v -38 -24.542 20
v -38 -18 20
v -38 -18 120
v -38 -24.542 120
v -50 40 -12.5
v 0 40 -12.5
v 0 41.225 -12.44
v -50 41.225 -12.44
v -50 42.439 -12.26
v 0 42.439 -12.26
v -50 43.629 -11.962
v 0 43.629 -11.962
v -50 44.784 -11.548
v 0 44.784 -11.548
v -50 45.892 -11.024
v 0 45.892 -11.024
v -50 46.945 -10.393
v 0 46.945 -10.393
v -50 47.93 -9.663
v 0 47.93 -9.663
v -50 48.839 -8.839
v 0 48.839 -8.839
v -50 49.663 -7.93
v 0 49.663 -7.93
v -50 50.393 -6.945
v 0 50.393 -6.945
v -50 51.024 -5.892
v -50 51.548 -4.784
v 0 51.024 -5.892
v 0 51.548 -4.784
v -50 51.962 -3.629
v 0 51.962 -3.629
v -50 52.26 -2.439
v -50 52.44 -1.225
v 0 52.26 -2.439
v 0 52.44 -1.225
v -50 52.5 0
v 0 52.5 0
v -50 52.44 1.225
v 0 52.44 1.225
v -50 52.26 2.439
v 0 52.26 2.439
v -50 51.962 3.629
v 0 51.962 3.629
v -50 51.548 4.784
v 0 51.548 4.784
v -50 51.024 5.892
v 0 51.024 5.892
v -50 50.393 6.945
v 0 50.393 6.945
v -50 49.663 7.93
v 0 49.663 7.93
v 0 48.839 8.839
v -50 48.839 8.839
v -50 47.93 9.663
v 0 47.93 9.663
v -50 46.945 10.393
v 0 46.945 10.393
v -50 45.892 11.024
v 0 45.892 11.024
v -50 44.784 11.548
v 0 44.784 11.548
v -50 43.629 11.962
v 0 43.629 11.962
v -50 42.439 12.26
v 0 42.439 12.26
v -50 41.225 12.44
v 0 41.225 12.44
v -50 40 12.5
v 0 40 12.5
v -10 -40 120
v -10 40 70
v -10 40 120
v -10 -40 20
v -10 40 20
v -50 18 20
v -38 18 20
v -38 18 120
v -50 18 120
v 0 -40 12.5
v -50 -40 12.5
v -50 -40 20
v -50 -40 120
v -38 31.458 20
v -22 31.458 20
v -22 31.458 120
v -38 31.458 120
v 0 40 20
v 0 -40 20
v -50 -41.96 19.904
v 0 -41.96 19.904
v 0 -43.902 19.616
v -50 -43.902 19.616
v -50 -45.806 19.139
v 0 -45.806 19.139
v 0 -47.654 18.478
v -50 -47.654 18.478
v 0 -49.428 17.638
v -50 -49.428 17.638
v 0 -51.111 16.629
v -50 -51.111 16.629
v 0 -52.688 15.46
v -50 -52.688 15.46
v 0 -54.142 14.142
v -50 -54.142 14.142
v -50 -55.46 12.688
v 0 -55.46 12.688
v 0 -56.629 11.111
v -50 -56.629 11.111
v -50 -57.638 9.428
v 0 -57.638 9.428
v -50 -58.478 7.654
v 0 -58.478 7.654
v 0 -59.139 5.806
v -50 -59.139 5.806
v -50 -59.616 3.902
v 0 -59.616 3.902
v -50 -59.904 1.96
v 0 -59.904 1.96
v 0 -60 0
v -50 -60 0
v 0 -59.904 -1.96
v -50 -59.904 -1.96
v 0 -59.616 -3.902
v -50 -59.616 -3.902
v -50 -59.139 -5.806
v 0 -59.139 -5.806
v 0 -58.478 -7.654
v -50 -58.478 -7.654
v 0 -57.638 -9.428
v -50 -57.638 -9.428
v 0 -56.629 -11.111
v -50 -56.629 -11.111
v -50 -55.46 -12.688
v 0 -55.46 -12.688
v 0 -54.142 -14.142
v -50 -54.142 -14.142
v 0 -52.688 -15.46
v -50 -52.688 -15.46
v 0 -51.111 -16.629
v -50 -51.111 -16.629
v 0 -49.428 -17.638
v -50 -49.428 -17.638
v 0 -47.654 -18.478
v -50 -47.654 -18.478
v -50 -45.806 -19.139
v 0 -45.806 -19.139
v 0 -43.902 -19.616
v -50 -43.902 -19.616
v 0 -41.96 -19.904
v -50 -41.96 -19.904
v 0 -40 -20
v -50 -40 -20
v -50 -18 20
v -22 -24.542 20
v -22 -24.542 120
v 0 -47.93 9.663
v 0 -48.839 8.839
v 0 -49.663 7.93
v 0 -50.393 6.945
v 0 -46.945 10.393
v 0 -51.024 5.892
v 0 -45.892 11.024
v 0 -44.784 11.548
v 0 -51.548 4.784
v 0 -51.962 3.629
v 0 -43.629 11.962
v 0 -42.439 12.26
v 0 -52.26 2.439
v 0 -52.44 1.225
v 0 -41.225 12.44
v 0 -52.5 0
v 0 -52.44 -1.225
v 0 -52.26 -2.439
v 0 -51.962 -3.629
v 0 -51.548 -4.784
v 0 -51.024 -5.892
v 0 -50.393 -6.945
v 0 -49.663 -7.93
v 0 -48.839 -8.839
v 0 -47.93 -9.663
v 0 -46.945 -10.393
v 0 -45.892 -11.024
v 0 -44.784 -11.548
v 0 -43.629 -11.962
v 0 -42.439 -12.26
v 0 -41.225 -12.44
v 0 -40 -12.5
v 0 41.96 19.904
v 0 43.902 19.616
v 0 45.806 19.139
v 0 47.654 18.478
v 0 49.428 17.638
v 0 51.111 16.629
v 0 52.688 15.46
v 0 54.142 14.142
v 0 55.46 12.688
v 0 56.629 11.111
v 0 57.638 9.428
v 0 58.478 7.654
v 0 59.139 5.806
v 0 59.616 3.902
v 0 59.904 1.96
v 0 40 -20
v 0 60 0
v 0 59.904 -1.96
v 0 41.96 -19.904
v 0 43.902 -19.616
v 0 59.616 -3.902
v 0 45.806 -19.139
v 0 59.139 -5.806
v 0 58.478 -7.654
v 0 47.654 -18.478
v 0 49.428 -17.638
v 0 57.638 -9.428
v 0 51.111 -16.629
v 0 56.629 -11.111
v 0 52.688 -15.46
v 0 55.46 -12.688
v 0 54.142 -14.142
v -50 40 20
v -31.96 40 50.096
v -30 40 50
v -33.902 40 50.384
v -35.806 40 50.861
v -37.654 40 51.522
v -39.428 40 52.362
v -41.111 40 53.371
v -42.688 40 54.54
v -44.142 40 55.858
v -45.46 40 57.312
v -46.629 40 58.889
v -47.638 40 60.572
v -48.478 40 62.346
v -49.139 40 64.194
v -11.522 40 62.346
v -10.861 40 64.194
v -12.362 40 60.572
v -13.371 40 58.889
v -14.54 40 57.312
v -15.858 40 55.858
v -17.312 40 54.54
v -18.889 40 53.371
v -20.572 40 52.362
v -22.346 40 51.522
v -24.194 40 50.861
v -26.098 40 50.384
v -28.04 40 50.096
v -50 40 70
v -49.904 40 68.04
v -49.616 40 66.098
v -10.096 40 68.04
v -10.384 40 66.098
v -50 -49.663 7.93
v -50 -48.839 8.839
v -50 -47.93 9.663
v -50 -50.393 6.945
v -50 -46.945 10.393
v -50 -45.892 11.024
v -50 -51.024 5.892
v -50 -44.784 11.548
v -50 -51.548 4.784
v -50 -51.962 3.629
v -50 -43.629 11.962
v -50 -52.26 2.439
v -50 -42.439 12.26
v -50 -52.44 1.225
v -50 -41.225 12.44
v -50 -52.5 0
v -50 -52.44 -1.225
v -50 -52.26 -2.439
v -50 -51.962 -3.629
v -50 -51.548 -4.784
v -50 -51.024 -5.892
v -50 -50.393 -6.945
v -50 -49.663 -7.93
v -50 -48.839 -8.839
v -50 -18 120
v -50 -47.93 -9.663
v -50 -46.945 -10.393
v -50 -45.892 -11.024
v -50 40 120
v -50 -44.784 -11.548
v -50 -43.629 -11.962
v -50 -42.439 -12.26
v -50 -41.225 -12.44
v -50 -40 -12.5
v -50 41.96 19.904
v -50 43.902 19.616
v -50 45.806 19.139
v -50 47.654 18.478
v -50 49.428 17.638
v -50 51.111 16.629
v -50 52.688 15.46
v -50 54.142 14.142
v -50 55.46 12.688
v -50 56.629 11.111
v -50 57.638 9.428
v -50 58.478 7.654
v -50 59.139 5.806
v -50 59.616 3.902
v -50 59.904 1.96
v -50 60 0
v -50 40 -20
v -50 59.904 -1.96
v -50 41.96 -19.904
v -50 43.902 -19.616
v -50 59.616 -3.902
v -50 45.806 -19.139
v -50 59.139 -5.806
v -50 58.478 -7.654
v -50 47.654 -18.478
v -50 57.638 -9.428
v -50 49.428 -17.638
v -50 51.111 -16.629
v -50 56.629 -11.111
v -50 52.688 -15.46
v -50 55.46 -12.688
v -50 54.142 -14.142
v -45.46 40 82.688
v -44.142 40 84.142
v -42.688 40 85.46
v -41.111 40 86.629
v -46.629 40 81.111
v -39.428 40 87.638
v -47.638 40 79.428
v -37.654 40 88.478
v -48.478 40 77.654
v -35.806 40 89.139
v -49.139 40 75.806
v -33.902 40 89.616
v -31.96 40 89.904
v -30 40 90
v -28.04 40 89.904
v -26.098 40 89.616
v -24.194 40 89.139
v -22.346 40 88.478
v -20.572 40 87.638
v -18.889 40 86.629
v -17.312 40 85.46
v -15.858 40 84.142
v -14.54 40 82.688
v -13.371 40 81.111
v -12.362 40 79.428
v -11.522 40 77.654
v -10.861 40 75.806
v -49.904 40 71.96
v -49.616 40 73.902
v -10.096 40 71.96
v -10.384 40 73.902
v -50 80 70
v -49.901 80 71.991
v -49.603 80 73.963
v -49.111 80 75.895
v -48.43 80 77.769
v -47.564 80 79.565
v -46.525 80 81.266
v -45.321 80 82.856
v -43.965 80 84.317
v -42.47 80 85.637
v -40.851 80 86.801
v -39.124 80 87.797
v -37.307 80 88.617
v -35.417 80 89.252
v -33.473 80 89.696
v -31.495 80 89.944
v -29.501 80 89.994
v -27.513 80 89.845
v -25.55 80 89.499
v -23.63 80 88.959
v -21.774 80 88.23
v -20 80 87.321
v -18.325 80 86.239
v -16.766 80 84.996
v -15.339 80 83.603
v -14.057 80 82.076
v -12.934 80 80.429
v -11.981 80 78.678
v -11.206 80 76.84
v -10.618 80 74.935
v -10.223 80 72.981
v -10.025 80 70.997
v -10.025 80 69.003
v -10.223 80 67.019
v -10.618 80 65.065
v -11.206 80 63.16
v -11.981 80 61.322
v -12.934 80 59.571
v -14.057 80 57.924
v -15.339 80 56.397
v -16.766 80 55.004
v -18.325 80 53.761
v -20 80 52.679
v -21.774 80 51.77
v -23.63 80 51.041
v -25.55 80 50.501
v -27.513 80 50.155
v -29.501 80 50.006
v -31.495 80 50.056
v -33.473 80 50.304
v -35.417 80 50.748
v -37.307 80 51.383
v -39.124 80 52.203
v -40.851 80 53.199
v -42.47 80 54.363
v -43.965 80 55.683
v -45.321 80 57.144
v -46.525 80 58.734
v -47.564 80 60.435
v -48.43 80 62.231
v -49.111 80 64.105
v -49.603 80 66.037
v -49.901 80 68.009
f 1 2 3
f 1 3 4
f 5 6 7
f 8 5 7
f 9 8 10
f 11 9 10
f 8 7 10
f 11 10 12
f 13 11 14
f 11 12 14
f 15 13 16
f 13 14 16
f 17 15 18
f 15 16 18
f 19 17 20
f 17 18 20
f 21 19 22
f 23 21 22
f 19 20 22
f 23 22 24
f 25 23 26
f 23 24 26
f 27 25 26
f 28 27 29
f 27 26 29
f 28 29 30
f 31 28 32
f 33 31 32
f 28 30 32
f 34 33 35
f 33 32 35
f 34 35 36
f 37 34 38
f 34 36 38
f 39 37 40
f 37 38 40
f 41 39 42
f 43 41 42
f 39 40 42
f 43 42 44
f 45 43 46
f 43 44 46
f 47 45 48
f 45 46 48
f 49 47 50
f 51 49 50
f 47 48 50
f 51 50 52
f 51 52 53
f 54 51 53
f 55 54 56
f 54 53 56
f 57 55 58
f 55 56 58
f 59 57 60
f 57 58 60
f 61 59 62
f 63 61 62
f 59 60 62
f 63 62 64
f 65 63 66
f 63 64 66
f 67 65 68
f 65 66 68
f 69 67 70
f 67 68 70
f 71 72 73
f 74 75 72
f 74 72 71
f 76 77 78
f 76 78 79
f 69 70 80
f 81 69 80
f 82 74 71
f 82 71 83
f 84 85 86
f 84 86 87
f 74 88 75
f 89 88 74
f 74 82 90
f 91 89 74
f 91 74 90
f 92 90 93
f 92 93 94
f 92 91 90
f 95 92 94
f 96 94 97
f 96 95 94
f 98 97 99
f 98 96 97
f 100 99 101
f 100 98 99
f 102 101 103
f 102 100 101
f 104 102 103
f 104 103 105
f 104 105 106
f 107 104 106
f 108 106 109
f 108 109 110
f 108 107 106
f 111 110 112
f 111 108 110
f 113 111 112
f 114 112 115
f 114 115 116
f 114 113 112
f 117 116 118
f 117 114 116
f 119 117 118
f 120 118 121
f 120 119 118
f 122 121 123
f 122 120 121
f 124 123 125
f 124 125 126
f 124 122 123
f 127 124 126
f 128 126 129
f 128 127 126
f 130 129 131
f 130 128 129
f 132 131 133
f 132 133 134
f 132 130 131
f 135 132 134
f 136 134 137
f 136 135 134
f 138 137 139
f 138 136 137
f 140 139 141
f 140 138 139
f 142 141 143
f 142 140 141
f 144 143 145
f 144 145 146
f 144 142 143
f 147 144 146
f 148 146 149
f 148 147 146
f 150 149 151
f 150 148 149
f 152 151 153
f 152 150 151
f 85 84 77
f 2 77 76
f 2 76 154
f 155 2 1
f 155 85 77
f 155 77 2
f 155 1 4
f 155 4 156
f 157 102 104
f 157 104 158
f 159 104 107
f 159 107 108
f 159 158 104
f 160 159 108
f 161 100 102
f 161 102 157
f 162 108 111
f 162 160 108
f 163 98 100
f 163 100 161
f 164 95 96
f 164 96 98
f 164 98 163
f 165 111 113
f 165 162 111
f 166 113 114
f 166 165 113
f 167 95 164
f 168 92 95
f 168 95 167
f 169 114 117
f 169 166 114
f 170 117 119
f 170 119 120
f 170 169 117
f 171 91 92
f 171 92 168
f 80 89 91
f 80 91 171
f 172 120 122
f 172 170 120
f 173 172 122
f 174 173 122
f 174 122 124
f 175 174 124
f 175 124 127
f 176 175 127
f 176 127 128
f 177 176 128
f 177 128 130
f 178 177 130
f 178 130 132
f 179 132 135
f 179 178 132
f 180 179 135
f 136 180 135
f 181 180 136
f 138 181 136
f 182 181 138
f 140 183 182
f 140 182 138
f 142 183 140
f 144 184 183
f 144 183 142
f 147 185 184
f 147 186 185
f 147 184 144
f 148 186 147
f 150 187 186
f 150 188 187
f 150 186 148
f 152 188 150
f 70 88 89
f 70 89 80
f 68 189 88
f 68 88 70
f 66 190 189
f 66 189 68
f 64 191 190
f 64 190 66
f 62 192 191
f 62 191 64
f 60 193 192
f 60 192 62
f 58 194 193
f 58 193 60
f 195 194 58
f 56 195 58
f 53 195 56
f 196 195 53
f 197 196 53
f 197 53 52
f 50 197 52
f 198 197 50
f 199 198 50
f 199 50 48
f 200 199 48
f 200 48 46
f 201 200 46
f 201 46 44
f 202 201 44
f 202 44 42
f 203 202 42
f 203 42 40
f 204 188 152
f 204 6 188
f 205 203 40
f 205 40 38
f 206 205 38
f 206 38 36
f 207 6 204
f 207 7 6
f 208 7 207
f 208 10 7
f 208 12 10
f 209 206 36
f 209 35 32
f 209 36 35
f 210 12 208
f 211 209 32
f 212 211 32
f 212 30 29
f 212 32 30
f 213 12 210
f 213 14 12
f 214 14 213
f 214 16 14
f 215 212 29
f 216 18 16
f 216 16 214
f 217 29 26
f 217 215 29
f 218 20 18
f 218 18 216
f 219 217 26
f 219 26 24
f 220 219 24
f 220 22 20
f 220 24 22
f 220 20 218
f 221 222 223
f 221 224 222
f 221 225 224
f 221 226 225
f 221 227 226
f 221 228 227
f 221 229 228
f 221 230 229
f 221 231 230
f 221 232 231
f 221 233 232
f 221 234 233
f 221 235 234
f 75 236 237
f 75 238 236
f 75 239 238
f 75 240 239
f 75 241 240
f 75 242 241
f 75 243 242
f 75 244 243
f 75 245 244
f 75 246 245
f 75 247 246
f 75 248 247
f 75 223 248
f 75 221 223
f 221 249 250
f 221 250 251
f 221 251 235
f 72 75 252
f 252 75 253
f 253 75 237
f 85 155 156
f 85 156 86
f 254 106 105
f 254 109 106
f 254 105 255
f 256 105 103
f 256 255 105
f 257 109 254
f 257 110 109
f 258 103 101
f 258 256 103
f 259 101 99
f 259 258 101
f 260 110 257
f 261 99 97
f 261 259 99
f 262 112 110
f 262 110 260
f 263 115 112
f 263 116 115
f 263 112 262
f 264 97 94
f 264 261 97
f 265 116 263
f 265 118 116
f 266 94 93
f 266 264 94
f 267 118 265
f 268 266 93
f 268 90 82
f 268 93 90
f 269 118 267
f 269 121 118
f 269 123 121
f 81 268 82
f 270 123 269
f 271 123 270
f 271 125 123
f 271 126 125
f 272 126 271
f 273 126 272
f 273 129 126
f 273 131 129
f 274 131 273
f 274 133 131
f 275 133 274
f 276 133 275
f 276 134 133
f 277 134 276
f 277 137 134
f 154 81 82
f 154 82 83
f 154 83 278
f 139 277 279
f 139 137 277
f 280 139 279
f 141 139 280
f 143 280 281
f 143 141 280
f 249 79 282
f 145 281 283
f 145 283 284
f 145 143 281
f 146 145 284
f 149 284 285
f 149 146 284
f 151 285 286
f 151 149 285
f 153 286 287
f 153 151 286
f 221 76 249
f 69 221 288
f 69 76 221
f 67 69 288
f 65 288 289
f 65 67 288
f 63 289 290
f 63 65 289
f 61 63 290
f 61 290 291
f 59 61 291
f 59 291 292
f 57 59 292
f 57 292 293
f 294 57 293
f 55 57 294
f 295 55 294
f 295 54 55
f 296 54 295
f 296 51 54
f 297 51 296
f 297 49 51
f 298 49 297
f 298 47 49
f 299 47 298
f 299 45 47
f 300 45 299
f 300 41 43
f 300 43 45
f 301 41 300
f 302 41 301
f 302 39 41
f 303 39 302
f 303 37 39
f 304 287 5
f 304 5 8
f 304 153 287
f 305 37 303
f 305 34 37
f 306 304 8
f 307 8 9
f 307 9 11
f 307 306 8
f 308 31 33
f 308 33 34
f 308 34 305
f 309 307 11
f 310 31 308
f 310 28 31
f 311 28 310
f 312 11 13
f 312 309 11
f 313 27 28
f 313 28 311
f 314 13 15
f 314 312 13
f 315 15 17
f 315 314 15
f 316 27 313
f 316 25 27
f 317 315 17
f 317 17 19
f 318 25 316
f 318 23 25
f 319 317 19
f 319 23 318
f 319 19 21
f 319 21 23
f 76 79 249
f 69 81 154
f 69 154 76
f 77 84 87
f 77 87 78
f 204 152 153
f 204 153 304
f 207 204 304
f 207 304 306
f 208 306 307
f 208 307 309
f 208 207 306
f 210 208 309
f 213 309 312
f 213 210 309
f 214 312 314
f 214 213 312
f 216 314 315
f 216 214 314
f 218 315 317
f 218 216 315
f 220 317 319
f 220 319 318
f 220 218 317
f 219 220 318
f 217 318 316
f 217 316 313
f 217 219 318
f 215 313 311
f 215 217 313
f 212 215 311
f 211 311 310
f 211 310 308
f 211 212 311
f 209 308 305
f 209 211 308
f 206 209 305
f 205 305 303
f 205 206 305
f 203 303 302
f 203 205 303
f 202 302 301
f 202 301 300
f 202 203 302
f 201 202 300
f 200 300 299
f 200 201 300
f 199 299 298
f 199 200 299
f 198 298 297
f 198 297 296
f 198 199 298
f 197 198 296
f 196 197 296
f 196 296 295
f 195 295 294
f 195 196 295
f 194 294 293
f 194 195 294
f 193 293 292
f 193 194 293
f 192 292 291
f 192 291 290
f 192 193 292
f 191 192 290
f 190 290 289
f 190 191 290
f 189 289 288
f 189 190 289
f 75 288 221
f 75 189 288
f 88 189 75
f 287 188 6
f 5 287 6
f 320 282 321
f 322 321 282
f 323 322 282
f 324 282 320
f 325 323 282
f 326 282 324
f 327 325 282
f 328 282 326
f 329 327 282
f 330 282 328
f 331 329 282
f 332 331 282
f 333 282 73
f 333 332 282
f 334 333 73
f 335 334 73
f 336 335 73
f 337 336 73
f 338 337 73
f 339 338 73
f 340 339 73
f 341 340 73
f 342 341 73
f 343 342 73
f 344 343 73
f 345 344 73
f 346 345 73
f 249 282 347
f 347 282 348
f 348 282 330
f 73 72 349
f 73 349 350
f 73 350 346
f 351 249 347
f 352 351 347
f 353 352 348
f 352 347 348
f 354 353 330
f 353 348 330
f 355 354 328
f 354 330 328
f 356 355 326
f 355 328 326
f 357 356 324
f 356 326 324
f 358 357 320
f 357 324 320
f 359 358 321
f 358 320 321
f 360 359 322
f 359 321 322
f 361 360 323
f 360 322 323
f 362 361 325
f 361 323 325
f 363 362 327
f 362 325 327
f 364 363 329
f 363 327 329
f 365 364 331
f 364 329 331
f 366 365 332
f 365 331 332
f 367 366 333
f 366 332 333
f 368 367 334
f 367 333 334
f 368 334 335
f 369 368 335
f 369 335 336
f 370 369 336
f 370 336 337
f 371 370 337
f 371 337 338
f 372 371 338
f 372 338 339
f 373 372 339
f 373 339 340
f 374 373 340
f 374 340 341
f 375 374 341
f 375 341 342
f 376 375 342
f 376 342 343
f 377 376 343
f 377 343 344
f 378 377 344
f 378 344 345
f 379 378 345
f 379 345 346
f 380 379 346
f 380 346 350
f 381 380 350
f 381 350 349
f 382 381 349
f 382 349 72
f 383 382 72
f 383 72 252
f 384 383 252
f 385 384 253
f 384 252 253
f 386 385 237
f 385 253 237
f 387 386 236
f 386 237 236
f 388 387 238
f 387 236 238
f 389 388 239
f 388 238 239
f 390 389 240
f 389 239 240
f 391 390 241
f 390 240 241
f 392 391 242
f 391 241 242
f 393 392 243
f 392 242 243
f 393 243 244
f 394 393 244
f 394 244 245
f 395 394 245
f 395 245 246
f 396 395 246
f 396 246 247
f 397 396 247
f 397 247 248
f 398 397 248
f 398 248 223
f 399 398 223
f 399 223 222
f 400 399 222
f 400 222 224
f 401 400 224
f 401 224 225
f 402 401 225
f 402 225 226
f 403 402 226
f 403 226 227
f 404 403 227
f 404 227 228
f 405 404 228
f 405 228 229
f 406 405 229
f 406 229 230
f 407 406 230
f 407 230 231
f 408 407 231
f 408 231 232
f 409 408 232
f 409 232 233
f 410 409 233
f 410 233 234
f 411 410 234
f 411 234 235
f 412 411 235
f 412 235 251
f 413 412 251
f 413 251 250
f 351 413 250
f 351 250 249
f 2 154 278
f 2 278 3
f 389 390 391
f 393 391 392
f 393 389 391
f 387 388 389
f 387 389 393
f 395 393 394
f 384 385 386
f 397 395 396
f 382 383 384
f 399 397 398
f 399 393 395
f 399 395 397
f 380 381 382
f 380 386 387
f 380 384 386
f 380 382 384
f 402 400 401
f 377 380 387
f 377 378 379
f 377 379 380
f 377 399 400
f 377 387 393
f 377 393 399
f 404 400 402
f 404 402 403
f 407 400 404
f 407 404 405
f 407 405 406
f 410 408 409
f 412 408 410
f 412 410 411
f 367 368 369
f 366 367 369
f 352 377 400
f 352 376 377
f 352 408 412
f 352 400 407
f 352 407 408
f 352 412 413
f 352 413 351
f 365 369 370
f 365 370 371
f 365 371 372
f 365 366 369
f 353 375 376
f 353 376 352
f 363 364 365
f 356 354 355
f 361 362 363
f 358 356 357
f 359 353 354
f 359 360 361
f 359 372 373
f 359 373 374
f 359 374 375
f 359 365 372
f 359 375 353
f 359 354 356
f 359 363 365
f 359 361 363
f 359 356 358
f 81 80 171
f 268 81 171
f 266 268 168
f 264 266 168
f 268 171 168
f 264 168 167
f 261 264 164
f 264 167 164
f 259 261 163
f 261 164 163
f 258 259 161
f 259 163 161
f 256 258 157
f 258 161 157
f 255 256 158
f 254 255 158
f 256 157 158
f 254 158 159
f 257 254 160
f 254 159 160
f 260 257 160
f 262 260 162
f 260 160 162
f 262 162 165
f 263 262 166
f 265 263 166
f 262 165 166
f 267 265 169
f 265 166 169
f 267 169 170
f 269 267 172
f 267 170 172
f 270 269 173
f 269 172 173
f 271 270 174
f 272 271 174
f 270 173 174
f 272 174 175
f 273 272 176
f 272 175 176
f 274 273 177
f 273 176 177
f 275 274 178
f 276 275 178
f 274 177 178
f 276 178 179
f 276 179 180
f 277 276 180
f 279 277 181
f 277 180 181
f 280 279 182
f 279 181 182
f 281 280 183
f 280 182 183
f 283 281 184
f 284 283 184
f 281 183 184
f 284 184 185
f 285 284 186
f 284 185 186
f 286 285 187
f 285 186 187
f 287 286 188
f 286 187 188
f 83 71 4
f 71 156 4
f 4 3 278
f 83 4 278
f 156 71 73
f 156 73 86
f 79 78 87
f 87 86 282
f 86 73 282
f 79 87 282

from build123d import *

# Parameters (mm, degrees)
BOSS_EXTRUDE1_DEPTH = 50
BOSS_EXTRUDE2_DEPTH = 100
SKETCH4_R           = 20
BOSS_EXTRUDE3_DEPTH = 40


with BuildPart() as part:
    # Sketch2 → Boss-Extrude1 (new body)
    with BuildSketch(Plane(origin=(0, 0, 0), x_dir=(0, 0, -1), z_dir=(1, 0, 0))):
        with BuildLine():
            Line((-20, 40), (-20, -40))
            ThreePointArc((-20, -40), (0, -60), (20, -40))
            Line((20, -40), (20, 40))
            ThreePointArc((20, 40), (0, 60), (-20, 40))
        make_face()
        with BuildLine():
            Line((-12.5, 40), (-12.5, -40))
            ThreePointArc((-12.5, -40), (0, -52.5), (12.5, -40))
            Line((12.5, -40), (12.5, 40))
            ThreePointArc((12.5, 40), (0, 52.5), (-12.5, 40))
        make_face(mode=Mode.SUBTRACT)
    extrude(amount=-BOSS_EXTRUDE1_DEPTH)

    # Sketch3 → Boss-Extrude2 (add)
    with BuildSketch(Plane.XY.offset(20)):
        Polygon((-50, 40), (-10, 40), (-10, -40), (-50, -40), (-50, -18), (-38, -18), (-38, -24.542301432), (-22, -24.542301432), (-22, 31.457698568), (-38, 31.457698568), (-38, 18), (-50, 18), align=None)
    extrude(amount=BOSS_EXTRUDE2_DEPTH)

    # Sketch4 → Boss-Extrude3 (add)
    with BuildSketch(Plane(origin=(0, 40, 0), x_dir=(1, 0, 0), z_dir=(0, 1, 0))):
        with Locations(Location((-30, -70, 0), (0, 0, 180))):
            Circle(SKETCH4_R)
    extrude(amount=BOSS_EXTRUDE3_DEPTH)


solid = part.part
